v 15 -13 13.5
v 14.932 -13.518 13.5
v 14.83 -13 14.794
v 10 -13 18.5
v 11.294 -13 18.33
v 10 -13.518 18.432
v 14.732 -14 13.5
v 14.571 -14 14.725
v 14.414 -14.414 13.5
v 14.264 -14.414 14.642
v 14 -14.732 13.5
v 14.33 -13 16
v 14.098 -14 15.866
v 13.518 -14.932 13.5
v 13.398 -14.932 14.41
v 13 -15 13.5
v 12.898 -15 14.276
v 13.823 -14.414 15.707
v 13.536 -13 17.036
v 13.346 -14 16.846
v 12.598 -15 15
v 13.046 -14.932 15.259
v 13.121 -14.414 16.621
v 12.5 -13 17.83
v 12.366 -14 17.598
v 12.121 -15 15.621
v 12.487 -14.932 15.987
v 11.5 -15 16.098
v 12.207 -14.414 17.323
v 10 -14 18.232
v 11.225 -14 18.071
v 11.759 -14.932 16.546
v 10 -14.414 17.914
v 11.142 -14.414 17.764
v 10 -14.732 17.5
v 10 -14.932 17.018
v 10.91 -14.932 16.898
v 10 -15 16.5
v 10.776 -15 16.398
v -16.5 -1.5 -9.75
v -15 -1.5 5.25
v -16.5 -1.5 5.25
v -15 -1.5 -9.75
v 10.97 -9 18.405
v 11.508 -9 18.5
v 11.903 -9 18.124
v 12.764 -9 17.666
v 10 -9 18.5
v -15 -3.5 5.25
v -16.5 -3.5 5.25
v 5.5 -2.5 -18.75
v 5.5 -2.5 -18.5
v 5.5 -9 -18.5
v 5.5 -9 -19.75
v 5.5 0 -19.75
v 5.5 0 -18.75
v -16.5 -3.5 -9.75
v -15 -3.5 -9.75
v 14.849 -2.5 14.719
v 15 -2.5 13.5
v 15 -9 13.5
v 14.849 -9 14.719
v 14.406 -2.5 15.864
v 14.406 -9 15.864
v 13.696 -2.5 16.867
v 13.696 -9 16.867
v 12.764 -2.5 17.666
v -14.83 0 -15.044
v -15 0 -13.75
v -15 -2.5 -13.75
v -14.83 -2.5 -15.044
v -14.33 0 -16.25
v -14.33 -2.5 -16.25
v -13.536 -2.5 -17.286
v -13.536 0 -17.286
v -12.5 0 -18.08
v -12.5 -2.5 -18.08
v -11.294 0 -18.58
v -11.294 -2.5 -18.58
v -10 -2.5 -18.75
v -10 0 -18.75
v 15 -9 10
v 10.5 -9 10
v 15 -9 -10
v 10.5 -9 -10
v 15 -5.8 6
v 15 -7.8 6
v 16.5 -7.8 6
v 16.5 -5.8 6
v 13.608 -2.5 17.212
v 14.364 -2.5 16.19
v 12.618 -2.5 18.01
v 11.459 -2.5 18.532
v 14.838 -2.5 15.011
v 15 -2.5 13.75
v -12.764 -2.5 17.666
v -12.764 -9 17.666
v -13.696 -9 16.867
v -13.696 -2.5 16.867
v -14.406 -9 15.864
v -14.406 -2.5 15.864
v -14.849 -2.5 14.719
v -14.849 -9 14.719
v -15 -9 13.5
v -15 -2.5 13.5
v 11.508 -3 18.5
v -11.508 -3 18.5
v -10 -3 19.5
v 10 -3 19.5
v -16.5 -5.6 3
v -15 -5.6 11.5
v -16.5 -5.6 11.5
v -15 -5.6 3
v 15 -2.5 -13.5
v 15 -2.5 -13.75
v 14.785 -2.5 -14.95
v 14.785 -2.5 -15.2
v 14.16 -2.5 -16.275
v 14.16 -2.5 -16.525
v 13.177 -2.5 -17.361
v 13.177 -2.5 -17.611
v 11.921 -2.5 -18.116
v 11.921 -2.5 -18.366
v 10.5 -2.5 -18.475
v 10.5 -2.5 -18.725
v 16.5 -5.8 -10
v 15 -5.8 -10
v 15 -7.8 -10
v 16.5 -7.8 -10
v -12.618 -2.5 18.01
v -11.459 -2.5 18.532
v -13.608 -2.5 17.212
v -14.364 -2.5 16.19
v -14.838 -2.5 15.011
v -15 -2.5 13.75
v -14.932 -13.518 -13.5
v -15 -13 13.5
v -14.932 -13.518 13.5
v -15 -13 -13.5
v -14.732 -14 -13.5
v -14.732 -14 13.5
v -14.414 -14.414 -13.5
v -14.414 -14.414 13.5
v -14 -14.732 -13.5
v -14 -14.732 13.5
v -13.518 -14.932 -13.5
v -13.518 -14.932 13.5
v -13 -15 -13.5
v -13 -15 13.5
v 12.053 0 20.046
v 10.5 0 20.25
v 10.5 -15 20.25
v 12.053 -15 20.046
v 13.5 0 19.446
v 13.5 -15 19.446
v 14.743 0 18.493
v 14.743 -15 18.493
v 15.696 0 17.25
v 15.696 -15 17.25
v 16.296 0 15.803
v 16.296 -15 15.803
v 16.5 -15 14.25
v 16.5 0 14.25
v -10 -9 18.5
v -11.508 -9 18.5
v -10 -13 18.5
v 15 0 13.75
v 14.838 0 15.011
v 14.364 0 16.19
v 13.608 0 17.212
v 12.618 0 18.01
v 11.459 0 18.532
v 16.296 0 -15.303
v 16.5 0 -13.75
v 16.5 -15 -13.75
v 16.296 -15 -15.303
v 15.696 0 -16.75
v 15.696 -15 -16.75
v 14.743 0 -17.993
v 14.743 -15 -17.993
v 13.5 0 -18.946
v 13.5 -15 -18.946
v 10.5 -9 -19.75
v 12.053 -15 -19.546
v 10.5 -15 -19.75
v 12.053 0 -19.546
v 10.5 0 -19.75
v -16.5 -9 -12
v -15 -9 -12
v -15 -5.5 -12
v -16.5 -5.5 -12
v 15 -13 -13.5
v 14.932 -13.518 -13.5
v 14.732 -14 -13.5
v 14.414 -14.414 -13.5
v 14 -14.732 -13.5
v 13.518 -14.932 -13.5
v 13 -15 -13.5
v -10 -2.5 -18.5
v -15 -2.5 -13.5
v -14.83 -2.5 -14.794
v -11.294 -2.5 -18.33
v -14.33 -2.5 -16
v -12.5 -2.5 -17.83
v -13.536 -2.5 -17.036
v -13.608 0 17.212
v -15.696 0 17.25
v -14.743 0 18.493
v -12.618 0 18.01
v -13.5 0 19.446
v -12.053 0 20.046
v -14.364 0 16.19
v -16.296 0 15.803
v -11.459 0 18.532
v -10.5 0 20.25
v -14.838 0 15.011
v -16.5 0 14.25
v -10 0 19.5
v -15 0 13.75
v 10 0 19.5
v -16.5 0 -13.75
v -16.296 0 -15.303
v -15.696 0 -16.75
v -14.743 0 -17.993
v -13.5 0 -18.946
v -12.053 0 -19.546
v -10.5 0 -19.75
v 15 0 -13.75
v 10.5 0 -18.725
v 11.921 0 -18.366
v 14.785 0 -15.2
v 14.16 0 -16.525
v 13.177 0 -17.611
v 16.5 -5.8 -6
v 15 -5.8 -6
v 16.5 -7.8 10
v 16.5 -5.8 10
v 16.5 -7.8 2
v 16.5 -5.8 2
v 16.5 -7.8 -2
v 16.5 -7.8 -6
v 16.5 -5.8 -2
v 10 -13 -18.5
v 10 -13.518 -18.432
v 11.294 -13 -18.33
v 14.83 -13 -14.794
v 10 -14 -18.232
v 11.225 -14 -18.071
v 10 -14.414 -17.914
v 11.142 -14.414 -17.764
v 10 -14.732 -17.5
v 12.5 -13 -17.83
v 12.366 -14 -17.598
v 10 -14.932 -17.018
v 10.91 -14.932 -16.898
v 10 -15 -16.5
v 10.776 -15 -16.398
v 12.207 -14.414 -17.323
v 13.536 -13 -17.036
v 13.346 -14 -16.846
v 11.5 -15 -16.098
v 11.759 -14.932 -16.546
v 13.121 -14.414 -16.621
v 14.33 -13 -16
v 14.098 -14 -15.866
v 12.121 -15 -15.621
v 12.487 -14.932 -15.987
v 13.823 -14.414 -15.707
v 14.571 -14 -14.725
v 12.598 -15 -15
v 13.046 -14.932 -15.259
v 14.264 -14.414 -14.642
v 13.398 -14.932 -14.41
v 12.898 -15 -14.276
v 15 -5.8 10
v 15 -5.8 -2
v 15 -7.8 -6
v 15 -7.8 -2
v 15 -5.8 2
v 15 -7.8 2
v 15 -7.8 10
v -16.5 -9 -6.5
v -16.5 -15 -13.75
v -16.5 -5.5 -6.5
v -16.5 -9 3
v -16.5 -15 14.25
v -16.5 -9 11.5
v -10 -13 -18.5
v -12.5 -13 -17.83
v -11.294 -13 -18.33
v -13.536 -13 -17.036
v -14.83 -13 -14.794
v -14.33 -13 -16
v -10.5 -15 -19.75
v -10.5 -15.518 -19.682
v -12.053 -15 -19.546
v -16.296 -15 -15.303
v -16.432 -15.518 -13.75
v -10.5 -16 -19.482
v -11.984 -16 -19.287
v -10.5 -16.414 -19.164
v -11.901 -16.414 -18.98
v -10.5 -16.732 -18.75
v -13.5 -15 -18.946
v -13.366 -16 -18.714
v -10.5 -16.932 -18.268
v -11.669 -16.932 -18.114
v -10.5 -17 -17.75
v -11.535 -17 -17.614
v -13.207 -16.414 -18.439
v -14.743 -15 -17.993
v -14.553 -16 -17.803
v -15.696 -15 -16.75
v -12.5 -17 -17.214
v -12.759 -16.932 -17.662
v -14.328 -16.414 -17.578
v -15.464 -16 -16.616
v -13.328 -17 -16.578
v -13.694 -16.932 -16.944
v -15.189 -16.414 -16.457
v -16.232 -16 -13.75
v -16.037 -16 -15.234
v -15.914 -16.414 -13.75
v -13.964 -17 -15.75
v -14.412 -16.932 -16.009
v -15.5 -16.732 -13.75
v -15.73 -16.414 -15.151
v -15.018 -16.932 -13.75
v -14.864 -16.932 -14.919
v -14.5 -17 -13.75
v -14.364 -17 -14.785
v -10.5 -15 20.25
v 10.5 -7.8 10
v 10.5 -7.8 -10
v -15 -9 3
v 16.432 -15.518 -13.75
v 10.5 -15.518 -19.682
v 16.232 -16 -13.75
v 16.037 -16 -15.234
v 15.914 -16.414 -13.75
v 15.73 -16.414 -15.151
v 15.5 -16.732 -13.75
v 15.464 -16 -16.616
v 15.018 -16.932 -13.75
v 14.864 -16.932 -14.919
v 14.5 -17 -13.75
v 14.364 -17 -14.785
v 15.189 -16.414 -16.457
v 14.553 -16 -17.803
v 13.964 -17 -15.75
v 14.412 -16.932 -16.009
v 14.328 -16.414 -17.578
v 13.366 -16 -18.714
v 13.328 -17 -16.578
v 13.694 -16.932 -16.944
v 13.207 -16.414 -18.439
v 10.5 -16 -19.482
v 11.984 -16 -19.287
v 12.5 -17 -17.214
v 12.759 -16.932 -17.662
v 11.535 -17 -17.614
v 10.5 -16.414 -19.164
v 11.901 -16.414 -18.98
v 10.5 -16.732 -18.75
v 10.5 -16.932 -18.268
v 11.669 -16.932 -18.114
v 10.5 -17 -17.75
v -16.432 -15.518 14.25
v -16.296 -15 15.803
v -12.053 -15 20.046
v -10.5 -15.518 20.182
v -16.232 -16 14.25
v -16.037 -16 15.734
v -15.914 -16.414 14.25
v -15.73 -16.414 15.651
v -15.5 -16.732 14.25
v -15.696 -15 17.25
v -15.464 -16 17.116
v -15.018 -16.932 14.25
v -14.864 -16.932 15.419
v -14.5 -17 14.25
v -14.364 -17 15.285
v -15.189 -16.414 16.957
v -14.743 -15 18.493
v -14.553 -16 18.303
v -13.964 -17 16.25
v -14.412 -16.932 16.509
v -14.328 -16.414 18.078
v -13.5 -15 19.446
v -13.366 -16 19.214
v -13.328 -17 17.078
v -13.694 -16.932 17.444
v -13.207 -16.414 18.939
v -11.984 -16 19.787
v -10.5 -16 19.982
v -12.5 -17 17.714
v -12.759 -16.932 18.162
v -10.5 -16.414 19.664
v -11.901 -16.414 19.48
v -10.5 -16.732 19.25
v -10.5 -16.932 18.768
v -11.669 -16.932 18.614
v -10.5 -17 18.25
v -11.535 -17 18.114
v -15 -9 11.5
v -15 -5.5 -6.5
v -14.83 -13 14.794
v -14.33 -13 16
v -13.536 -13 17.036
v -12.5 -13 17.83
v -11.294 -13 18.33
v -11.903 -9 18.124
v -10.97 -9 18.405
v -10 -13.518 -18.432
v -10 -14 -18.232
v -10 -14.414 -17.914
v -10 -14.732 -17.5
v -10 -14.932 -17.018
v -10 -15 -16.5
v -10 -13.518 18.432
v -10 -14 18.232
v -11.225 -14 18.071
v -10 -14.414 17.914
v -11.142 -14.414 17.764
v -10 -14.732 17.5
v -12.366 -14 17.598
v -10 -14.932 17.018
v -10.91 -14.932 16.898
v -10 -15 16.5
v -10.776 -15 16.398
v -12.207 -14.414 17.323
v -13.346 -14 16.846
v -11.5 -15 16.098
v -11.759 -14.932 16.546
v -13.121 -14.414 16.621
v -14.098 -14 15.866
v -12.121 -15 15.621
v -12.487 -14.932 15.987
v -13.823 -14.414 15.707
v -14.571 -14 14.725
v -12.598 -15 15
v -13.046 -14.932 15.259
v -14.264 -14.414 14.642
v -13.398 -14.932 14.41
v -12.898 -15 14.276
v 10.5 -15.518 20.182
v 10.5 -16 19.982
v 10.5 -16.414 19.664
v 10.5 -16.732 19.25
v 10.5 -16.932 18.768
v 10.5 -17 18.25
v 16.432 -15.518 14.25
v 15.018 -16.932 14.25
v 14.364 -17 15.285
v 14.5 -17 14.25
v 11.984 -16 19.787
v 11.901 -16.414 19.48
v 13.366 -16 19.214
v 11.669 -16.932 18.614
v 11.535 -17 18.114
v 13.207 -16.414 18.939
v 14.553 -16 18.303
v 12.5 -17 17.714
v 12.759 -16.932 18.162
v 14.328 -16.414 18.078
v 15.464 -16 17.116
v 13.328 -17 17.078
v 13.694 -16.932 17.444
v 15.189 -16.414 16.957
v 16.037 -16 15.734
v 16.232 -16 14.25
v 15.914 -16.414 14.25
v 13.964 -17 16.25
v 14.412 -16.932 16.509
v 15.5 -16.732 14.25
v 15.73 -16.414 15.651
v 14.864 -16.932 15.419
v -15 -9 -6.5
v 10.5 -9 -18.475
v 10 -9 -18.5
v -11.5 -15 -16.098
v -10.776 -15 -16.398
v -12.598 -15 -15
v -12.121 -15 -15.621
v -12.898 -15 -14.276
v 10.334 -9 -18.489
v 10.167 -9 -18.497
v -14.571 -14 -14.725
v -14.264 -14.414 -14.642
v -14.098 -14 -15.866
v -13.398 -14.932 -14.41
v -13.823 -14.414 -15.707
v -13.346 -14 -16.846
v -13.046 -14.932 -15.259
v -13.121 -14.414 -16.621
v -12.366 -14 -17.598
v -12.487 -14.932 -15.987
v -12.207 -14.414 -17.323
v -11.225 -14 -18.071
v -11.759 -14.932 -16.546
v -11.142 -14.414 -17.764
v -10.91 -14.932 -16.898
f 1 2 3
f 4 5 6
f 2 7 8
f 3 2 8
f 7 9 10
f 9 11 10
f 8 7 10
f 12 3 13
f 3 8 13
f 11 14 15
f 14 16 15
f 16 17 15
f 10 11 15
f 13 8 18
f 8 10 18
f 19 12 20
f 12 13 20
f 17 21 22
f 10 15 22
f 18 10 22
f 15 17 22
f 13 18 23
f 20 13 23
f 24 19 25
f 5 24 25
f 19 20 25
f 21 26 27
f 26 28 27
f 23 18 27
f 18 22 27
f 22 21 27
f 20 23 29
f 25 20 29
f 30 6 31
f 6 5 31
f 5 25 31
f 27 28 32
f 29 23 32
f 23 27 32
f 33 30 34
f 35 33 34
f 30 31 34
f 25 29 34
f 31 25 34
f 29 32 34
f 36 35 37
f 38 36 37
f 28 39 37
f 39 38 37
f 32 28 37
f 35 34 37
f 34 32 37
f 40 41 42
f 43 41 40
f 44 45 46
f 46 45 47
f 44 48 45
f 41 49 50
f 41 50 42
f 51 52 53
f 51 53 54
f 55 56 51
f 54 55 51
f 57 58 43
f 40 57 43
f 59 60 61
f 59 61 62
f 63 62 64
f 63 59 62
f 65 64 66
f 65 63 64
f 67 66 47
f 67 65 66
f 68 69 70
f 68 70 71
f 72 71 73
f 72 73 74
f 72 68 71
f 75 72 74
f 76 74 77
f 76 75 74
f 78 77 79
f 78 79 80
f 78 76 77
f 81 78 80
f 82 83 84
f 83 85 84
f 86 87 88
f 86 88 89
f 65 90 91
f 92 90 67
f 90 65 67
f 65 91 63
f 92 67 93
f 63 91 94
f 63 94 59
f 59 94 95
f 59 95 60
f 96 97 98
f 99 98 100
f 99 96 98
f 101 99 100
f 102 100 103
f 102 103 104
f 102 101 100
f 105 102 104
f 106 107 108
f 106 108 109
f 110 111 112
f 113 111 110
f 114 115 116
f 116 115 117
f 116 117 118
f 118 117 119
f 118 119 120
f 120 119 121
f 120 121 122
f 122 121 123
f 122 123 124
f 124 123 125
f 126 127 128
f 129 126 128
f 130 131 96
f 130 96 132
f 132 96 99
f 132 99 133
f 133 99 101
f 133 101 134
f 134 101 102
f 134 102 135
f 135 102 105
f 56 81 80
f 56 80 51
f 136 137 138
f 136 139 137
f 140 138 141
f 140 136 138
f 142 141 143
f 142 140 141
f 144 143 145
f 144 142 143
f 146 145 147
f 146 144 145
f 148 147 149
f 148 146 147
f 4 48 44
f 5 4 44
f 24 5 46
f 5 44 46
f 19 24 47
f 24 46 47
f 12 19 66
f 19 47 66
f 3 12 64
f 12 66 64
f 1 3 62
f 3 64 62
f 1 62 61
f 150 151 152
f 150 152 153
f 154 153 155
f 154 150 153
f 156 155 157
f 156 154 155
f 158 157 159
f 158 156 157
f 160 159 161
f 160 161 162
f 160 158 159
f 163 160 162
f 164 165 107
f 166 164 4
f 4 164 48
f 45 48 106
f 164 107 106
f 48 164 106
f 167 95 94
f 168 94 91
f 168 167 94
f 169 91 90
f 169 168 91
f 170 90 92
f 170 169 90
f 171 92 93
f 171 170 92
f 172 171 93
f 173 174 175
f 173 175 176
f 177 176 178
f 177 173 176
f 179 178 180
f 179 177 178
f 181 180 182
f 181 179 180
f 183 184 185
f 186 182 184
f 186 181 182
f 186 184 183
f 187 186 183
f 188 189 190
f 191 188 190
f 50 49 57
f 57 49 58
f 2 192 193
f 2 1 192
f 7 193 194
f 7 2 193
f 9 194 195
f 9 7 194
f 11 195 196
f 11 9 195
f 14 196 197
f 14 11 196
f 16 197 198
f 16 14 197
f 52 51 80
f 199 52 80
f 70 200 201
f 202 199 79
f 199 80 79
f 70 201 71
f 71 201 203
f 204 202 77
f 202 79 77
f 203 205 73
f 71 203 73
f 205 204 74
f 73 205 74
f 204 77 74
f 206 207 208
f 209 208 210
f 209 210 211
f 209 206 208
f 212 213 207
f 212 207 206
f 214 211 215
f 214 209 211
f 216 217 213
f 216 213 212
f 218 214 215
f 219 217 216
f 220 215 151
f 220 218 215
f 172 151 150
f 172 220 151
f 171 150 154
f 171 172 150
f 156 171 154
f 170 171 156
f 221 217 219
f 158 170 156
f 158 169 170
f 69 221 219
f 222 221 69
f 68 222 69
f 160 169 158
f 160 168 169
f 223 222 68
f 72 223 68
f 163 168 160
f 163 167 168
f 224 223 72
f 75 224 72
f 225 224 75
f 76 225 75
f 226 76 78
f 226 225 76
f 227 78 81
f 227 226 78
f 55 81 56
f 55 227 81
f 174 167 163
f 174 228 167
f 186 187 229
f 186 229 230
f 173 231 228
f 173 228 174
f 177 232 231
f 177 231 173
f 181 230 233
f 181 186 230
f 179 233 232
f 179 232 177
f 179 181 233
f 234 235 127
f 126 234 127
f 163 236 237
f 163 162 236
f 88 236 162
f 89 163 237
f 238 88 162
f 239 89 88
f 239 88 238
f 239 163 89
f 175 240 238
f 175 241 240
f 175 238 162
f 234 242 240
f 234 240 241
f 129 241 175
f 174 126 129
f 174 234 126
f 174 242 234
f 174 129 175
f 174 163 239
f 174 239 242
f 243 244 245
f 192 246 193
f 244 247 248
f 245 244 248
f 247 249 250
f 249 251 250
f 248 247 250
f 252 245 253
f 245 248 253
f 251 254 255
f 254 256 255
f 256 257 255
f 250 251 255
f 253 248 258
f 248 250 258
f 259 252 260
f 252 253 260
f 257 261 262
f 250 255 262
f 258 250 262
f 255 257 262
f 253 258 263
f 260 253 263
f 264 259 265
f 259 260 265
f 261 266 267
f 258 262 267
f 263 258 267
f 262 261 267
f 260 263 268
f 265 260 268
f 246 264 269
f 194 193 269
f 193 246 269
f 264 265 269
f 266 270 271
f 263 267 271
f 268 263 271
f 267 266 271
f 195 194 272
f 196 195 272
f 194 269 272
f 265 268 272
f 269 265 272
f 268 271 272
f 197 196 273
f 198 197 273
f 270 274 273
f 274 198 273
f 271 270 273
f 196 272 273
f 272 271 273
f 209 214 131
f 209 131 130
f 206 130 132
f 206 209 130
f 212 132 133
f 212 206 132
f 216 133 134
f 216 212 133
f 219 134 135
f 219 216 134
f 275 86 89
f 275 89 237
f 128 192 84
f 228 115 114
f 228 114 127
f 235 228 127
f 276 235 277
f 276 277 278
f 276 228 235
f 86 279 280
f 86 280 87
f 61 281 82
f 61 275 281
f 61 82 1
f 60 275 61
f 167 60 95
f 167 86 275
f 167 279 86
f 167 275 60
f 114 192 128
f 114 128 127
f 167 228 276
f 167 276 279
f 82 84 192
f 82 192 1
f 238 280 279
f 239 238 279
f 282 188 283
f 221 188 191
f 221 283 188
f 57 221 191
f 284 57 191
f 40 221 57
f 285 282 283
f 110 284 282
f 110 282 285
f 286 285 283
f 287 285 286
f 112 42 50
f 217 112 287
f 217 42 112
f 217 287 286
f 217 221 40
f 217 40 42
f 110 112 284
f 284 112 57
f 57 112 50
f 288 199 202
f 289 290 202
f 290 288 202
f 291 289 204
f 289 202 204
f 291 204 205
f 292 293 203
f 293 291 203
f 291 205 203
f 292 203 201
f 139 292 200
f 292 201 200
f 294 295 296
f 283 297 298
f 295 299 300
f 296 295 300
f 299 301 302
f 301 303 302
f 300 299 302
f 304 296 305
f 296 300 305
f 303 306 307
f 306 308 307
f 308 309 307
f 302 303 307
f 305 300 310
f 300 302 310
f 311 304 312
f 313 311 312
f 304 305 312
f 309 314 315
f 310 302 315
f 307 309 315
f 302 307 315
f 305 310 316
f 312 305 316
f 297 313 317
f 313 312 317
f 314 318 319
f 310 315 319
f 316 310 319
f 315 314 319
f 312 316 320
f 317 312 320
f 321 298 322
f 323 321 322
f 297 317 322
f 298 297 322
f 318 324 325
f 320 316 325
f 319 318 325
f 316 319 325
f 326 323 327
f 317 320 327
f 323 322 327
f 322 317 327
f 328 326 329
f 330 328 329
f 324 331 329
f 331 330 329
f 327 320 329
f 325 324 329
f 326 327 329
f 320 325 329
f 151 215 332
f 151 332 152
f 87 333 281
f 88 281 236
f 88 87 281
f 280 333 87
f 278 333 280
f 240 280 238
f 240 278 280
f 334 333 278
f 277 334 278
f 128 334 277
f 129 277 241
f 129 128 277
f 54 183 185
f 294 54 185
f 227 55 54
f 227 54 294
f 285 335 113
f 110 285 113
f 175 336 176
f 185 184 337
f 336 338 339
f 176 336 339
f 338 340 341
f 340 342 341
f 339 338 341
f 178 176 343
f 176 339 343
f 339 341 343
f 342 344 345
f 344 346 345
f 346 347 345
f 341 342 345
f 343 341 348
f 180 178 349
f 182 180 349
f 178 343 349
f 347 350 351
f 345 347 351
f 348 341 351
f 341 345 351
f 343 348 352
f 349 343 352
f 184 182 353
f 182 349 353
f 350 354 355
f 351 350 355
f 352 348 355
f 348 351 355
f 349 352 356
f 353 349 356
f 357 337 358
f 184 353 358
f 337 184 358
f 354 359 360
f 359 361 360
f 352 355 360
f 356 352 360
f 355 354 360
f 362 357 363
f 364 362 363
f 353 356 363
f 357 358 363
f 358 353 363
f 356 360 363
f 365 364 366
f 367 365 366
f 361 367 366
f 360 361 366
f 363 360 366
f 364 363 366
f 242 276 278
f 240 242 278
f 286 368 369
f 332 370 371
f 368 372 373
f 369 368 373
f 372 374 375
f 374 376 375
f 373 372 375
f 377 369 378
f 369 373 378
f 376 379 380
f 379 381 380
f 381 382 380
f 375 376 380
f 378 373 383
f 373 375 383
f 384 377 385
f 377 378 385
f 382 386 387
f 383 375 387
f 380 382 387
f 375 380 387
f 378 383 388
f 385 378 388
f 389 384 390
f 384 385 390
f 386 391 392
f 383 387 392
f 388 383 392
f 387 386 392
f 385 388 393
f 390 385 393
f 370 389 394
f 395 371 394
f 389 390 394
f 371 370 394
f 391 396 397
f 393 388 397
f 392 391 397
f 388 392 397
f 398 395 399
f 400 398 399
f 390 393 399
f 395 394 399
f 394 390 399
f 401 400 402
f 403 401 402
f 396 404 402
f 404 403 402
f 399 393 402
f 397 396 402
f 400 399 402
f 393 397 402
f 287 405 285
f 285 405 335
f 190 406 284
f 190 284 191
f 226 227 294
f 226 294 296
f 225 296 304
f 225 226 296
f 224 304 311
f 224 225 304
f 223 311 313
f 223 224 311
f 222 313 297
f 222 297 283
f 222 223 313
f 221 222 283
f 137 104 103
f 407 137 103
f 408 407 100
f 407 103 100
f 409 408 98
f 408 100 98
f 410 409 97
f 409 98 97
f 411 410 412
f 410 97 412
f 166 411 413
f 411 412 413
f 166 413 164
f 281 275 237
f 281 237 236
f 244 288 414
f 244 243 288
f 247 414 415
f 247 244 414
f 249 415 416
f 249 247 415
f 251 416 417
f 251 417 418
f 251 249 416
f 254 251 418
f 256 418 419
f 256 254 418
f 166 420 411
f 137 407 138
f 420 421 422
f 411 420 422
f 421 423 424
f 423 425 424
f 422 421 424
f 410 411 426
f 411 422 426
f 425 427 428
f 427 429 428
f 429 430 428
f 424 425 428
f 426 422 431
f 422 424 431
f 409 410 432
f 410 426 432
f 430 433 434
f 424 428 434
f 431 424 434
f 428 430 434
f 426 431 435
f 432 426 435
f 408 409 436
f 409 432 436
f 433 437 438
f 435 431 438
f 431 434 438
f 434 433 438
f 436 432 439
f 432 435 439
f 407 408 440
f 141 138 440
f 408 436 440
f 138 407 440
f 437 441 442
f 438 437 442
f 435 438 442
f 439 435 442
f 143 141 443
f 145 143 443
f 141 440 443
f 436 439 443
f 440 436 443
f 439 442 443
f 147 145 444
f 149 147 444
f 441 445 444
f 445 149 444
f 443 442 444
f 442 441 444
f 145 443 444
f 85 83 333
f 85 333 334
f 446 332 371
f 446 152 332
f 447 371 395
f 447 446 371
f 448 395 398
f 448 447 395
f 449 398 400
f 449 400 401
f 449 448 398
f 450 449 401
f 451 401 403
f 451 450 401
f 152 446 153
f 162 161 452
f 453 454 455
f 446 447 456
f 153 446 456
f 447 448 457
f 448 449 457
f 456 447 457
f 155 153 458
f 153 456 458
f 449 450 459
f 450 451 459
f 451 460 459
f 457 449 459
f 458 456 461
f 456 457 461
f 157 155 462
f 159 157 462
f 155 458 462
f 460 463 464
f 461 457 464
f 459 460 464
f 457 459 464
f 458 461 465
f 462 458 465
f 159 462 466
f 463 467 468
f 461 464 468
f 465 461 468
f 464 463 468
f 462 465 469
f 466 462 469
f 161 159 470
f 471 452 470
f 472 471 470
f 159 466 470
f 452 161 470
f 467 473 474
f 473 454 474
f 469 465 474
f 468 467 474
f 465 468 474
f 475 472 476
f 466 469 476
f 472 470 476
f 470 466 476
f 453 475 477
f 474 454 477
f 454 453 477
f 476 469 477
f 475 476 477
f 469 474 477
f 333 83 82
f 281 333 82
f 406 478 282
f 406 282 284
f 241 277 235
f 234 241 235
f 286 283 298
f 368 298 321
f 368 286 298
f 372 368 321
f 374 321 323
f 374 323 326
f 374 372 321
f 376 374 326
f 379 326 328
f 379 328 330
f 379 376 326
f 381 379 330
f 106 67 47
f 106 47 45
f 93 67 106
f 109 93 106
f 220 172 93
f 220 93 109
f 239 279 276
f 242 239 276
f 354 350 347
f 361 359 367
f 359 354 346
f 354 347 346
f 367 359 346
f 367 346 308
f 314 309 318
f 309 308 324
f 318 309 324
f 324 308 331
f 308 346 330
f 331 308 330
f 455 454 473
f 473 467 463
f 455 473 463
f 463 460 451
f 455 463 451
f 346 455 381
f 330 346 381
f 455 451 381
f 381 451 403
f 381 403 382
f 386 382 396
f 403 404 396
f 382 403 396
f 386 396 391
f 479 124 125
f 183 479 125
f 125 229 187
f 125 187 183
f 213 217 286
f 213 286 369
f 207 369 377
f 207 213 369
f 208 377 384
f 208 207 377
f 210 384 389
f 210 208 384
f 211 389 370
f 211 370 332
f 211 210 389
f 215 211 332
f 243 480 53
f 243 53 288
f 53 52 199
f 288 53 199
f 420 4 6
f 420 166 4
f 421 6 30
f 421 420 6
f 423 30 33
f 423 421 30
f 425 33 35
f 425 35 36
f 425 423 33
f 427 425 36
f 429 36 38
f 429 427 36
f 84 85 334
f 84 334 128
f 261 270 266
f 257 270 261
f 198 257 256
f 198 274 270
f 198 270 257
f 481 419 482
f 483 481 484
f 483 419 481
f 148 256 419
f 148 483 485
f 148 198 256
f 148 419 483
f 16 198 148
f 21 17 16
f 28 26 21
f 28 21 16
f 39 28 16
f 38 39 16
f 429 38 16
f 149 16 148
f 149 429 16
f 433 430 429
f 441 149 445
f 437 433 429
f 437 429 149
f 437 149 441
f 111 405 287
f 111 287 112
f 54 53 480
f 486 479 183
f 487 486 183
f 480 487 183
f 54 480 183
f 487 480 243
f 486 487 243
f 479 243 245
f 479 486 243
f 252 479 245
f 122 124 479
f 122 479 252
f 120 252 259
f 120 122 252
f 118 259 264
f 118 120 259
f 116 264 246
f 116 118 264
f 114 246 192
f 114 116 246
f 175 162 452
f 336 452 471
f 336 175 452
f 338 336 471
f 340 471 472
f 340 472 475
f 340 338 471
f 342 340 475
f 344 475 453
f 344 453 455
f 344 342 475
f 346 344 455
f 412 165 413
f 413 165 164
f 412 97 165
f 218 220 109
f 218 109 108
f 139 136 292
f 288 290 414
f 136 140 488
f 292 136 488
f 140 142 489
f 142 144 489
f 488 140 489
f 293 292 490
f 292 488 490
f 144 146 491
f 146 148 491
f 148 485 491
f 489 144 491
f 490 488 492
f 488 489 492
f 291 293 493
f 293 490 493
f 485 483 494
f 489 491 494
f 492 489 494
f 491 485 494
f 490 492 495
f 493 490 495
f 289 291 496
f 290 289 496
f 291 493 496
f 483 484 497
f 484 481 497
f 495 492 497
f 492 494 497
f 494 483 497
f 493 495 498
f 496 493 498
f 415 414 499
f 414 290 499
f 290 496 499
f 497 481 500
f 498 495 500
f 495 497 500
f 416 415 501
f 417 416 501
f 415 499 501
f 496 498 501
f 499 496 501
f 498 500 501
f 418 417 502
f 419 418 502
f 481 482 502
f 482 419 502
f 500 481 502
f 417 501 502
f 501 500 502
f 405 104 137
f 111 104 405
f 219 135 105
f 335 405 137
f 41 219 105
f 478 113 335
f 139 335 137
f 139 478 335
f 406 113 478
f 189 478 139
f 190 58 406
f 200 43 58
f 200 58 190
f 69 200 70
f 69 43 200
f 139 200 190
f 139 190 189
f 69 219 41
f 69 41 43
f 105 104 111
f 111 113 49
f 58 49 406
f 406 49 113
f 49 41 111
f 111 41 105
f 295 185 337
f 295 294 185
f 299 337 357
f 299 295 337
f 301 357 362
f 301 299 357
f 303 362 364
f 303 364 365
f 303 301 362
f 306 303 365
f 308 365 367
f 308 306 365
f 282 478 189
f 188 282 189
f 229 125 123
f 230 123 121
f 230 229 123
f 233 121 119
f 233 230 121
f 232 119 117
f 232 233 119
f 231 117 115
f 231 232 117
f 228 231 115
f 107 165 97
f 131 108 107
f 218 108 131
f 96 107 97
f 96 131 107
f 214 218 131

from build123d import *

# Parameters (mm, degrees)
EXTRUDE_1_DEPTH     = 9
EXTRUDE_2_DEPTH     = 1
SKETCH_4_W          = 8.5
SKETCH_4_H          = 3.4
SKETCH_4_W_2        = 15
SKETCH_4_H_2        = 2
SKETCH_4_W_3        = 5.5
SKETCH_4_H_3        = 3.5
CUT_EXTRUDE_1_DEPTH = 21
SKETCH_5_W          = 4
SKETCH_5_H          = 2
CUT_EXTRUDE_2_DEPTH = 7
EXTRUDE_3_DEPTH     = 6
SKETCH_9_W          = 5
SKETCH_9_H          = 1.5
CUT_EXTRUDE_4_DEPTH = 9
SKETCH_10_W         = 4.5
SKETCH_10_H         = 20
EXTRUDE_4_DEPTH     = 1.2
CUT_EXTRUDE_5_DEPTH = 2.5
CUT_EXTRUDE_6_DEPTH = 10
EXTRUDE_5_DEPTH     = 6
EXTRUDE_6_DEPTH     = 2
FILLET_1_R          = 2


with BuildPart() as part:
    # 草图1 → 凸台-拉伸1 (new body)
    with BuildSketch(Plane(origin=(0, 0, 0), x_dir=(1, 0, 0), z_dir=(0, 1, 0))):
        with BuildLine():
            Line((-16.5, 13.75), (-16.5, -14.25))
            ThreePointArc((-16.5, -14.25), (-14.742640687, -18.492640687), (-10.5, -20.25))
            Line((-10.5, -20.25), (10.5, -20.25))
            ThreePointArc((10.5, -20.25), (14.742640687, -18.492640687), (16.5, -14.25))
            Line((16.5, -14.25), (16.5, 13.75))
            ThreePointArc((16.5, 13.75), (14.742640687, 17.992640687), (10.5, 19.75))
            Line((10.5, 19.75), (-10.5, 19.75))
            ThreePointArc((-10.5, 19.75), (-14.742640687, 17.992640687), (-16.5, 13.75))
        make_face()
        with BuildLine():
            Line((-10, 18.5), (10, 18.5))
            ThreePointArc((10, 18.5), (13.535533906, 17.035533906), (15, 13.5))
            Line((15, 13.5), (15, -13.5))
            ThreePointArc((15, -13.5), (14.405736008, -15.864210276), (12.764203909, -17.666434537))
            Line((12.764203909, -17.666434537), (10, -19.500334285))
            Line((10, -19.500334285), (-10, -19.500334285))
            Line((-10, -19.500334285), (-12.764203909, -17.666434537))
            ThreePointArc((-12.764203909, -17.666434537), (-14.405736008, -15.864210276), (-15, -13.5))
            Line((-15, -13.5), (-15, 13.5))
            ThreePointArc((-15, 13.5), (-13.535533906, 17.035533906), (-10, 18.5))
        make_face(mode=Mode.SUBTRACT)
    extrude(amount=-EXTRUDE_1_DEPTH)

    # 草图3 → 凸台-拉伸2 (add)
    with BuildSketch(Plane.XZ.offset(9)):
        with BuildLine():
            Line((-10.5, -19.75), (10.5, -19.75))
            ThreePointArc((10.5, -19.75), (14.742640687, -17.992640687), (16.5, -13.75))
            Line((16.5, -13.75), (16.5, 14.25))
            ThreePointArc((16.5, 14.25), (14.742640687, 18.492640687), (10.5, 20.25))
            Line((10.5, 20.25), (-10.5, 20.25))
            ThreePointArc((-10.5, 20.25), (-14.742640687, 18.492640687), (-16.5, 14.25))
            Line((-16.5, 14.25), (-16.5, -13.75))
            ThreePointArc((-16.5, -13.75), (-14.742640687, -17.992640687), (-10.5, -19.75))
        make_face()
    extrude(amount=EXTRUDE_2_DEPTH)

    # 草图4 → 切除-拉伸1 (cut)
    with BuildSketch(Plane(origin=(-15, 0, 0), x_dir=(0, 0, -1), z_dir=(1, 0, 0))):
        with Locations((-7.250334285, -7.3)):
            Rectangle(SKETCH_4_W, SKETCH_4_H)
        with Locations((2.25, -2.5)):
            Rectangle(SKETCH_4_W_2, SKETCH_4_H_2)
        with Locations((9.25, -7.25)):
            Rectangle(SKETCH_4_W_3, SKETCH_4_H_3)
    extrude(amount=-CUT_EXTRUDE_1_DEPTH, mode=Mode.SUBTRACT)

    # 草图5 → 切除-拉伸2 (cut)
    with BuildSketch(Plane.ZY.offset(-15)):
        with Locations((0, -6.8)):
            Rectangle(SKETCH_5_W, SKETCH_5_H)
        with Locations((8, -6.8)):
            Rectangle(SKETCH_5_W, SKETCH_5_H)
        with Locations((-8, -6.8)):
            Rectangle(SKETCH_5_W, SKETCH_5_H)
    extrude(amount=-CUT_EXTRUDE_2_DEPTH, mode=Mode.SUBTRACT)

    # 草图6 → 凸台-拉伸3 (add)
    with BuildSketch(Plane(origin=(0, -9, 0), x_dir=(1, 0, 0), z_dir=(0, 1, 0))):
        Polygon((10, -19.500334285), (11.507785769, -18.5), (10, -18.5), (-10, -18.5), (-11.507785769, -18.5), (-10, -19.500334285), align=None)
    extrude(amount=EXTRUDE_3_DEPTH)

    # 草图9 → 切除-拉伸4 (cut)
    with BuildSketch(Plane(origin=(0, 0, 0), x_dir=(1, 0, 0), z_dir=(0, 1, 0))):
        with Locations((8, 19)):
            Rectangle(SKETCH_9_W, SKETCH_9_H)
    extrude(amount=-CUT_EXTRUDE_4_DEPTH, mode=Mode.SUBTRACT)

    # 草图10 → 凸台-拉伸4 (add)
    with BuildSketch(Plane(origin=(0, -9, 0), x_dir=(1, 0, 0), z_dir=(0, 1, 0))):
        with Locations((12.75, 0)):
            Rectangle(SKETCH_10_W, SKETCH_10_H)
    extrude(amount=EXTRUDE_4_DEPTH)

    # 草图12 → 切除-拉伸5 (cut)
    with BuildSketch(Plane(origin=(0, 0, 0), x_dir=(1, 0, 0), z_dir=(0, 1, 0))):
        with BuildLine():
            Line((10, -18.75), (-10, -18.75))
            ThreePointArc((-10, -18.75), (-13.535533906, -17.285533906), (-15, -13.75))
            Line((-15, -13.75), (-15, 13.75))
            ThreePointArc((-15, 13.75), (-13.535533906, 17.285533906), (-10, 18.75))
            Line((-10, 18.75), (10, 18.75))
            ThreePointArc((10, 18.75), (13.535533906, 17.285533906), (15, 13.75))
            Line((15, 13.75), (15, -13.75))
            ThreePointArc((15, -13.75), (13.535533906, -17.285533906), (10, -18.75))
        make_face()
    extrude(amount=-CUT_EXTRUDE_5_DEPTH, mode=Mode.SUBTRACT)

    # 草图13 → 切除-拉伸6 (cut)
    with BuildSketch(Plane(origin=(0, -9, 0), x_dir=(1, 0, 0), z_dir=(0, 1, 0))):
        with BuildLine():
            Line((-10, -18.5), (10, -18.5))
            ThreePointArc((10, -18.5), (13.535533906, -17.035533906), (15, -13.5))
            Line((15, -13.5), (15, 13.5))
            ThreePointArc((15, 13.5), (13.535533906, 17.035533906), (10, 18.5))
            Line((10, 18.5), (-10, 18.5))
            ThreePointArc((-10, 18.5), (-13.535533906, 17.035533906), (-15, 13.5))
            Line((-15, 13.5), (-15, -13.5))
            ThreePointArc((-15, -13.5), (-13.535533906, -17.035533906), (-10, -18.5))
        make_face()
    extrude(amount=-CUT_EXTRUDE_6_DEPTH, mode=Mode.SUBTRACT)

    # 草图14 → 凸台-拉伸5 (add)
    with BuildSketch(Plane.XZ.offset(9)):
        with BuildLine():
            Line((10.5, 20.25), (0, 20.25))
            Line((0, 20.25), (-10.5, 20.25))
            ThreePointArc((-10.5, 20.25), (-14.742640687, 18.492640687), (-16.5, 14.25))
            Line((-16.5, 14.25), (-16.5, -13.75))
            ThreePointArc((-16.5, -13.75), (-14.742640687, -17.992640687), (-10.5, -19.75))
            Line((-10.5, -19.75), (10.5, -19.75))
            ThreePointArc((10.5, -19.75), (14.742640687, -17.992640687), (16.5, -13.75))
            Line((16.5, -13.75), (16.5, 14.25))
            ThreePointArc((16.5, 14.25), (14.742640687, 18.492640687), (10.5, 20.25))
        make_face()
        with BuildLine():
            Line((-10, 18.5), (0, 18.5))
            Line((0, 18.5), (10, 18.5))
            ThreePointArc((10, 18.5), (13.535533906, 17.035533906), (15, 13.5))
            Line((15, 13.5), (15, 10))
            Line((15, 10), (15, -10))
            Line((15, -10), (15, -13.5))
            ThreePointArc((15, -13.5), (13.535533906, -17.035533906), (10, -18.5))
            Line((10, -18.5), (-10, -18.5))
            ThreePointArc((-10, -18.5), (-13.535533906, -17.035533906), (-15, -13.5))
            Line((-15, -13.5), (-15, 13.5))
            ThreePointArc((-15, 13.5), (-13.535533906, 17.035533906), (-10, 18.5))
        make_face(mode=Mode.SUBTRACT)
    extrude(amount=EXTRUDE_5_DEPTH)

    # 草图15 → 凸台-拉伸6 (add)
    with BuildSketch(Plane.XZ.offset(15)):
        with BuildLine():
            Line((-10.5, 20.25), (10.5, 20.25))
            ThreePointArc((10.5, 20.25), (14.742640687, 18.492640687), (16.5, 14.25))
            Line((16.5, 14.25), (16.5, -13.75))
            ThreePointArc((16.5, -13.75), (14.742640687, -17.992640687), (10.5, -19.75))
            Line((10.5, -19.75), (-10.5, -19.75))
            ThreePointArc((-10.5, -19.75), (-14.742640687, -17.992640687), (-16.5, -13.75))
            Line((-16.5, -13.75), (-16.5, 14.25))
            ThreePointArc((-16.5, 14.25), (-14.742640687, 18.492640687), (-10.5, 20.25))
        make_face()
    extrude(amount=EXTRUDE_6_DEPTH)

    # 圆角1
    fillet_1_edges = [part.edges().sort_by_distance(p)[0] for p in [
        (-13.535533906, -15, -17.035533906),
        (0, -15, -18.5),
        (13.535533906, -15, -17.035533906),
        (15, -15, 0),
        (13.535533906, -15, 17.035533906),
        (0, -15, 18.5),
        (-13.535533906, -15, 17.035533906),
        (-15, -15, 0),
        (-16.5, -17, 0.25),
        (-14.742640687, -17, 18.492640687),
        (0, -17, 20.25),
        (14.742640687, -17, 18.492640687),
        (16.5, -17, 0.25),
        (14.742640687, -17, -17.992640687),
        (0, -17, -19.75),
        (-14.742640687, -17, -17.992640687),
    ]]
    fillet(fillet_1_edges, radius=FILLET_1_R)


solid = part.part
